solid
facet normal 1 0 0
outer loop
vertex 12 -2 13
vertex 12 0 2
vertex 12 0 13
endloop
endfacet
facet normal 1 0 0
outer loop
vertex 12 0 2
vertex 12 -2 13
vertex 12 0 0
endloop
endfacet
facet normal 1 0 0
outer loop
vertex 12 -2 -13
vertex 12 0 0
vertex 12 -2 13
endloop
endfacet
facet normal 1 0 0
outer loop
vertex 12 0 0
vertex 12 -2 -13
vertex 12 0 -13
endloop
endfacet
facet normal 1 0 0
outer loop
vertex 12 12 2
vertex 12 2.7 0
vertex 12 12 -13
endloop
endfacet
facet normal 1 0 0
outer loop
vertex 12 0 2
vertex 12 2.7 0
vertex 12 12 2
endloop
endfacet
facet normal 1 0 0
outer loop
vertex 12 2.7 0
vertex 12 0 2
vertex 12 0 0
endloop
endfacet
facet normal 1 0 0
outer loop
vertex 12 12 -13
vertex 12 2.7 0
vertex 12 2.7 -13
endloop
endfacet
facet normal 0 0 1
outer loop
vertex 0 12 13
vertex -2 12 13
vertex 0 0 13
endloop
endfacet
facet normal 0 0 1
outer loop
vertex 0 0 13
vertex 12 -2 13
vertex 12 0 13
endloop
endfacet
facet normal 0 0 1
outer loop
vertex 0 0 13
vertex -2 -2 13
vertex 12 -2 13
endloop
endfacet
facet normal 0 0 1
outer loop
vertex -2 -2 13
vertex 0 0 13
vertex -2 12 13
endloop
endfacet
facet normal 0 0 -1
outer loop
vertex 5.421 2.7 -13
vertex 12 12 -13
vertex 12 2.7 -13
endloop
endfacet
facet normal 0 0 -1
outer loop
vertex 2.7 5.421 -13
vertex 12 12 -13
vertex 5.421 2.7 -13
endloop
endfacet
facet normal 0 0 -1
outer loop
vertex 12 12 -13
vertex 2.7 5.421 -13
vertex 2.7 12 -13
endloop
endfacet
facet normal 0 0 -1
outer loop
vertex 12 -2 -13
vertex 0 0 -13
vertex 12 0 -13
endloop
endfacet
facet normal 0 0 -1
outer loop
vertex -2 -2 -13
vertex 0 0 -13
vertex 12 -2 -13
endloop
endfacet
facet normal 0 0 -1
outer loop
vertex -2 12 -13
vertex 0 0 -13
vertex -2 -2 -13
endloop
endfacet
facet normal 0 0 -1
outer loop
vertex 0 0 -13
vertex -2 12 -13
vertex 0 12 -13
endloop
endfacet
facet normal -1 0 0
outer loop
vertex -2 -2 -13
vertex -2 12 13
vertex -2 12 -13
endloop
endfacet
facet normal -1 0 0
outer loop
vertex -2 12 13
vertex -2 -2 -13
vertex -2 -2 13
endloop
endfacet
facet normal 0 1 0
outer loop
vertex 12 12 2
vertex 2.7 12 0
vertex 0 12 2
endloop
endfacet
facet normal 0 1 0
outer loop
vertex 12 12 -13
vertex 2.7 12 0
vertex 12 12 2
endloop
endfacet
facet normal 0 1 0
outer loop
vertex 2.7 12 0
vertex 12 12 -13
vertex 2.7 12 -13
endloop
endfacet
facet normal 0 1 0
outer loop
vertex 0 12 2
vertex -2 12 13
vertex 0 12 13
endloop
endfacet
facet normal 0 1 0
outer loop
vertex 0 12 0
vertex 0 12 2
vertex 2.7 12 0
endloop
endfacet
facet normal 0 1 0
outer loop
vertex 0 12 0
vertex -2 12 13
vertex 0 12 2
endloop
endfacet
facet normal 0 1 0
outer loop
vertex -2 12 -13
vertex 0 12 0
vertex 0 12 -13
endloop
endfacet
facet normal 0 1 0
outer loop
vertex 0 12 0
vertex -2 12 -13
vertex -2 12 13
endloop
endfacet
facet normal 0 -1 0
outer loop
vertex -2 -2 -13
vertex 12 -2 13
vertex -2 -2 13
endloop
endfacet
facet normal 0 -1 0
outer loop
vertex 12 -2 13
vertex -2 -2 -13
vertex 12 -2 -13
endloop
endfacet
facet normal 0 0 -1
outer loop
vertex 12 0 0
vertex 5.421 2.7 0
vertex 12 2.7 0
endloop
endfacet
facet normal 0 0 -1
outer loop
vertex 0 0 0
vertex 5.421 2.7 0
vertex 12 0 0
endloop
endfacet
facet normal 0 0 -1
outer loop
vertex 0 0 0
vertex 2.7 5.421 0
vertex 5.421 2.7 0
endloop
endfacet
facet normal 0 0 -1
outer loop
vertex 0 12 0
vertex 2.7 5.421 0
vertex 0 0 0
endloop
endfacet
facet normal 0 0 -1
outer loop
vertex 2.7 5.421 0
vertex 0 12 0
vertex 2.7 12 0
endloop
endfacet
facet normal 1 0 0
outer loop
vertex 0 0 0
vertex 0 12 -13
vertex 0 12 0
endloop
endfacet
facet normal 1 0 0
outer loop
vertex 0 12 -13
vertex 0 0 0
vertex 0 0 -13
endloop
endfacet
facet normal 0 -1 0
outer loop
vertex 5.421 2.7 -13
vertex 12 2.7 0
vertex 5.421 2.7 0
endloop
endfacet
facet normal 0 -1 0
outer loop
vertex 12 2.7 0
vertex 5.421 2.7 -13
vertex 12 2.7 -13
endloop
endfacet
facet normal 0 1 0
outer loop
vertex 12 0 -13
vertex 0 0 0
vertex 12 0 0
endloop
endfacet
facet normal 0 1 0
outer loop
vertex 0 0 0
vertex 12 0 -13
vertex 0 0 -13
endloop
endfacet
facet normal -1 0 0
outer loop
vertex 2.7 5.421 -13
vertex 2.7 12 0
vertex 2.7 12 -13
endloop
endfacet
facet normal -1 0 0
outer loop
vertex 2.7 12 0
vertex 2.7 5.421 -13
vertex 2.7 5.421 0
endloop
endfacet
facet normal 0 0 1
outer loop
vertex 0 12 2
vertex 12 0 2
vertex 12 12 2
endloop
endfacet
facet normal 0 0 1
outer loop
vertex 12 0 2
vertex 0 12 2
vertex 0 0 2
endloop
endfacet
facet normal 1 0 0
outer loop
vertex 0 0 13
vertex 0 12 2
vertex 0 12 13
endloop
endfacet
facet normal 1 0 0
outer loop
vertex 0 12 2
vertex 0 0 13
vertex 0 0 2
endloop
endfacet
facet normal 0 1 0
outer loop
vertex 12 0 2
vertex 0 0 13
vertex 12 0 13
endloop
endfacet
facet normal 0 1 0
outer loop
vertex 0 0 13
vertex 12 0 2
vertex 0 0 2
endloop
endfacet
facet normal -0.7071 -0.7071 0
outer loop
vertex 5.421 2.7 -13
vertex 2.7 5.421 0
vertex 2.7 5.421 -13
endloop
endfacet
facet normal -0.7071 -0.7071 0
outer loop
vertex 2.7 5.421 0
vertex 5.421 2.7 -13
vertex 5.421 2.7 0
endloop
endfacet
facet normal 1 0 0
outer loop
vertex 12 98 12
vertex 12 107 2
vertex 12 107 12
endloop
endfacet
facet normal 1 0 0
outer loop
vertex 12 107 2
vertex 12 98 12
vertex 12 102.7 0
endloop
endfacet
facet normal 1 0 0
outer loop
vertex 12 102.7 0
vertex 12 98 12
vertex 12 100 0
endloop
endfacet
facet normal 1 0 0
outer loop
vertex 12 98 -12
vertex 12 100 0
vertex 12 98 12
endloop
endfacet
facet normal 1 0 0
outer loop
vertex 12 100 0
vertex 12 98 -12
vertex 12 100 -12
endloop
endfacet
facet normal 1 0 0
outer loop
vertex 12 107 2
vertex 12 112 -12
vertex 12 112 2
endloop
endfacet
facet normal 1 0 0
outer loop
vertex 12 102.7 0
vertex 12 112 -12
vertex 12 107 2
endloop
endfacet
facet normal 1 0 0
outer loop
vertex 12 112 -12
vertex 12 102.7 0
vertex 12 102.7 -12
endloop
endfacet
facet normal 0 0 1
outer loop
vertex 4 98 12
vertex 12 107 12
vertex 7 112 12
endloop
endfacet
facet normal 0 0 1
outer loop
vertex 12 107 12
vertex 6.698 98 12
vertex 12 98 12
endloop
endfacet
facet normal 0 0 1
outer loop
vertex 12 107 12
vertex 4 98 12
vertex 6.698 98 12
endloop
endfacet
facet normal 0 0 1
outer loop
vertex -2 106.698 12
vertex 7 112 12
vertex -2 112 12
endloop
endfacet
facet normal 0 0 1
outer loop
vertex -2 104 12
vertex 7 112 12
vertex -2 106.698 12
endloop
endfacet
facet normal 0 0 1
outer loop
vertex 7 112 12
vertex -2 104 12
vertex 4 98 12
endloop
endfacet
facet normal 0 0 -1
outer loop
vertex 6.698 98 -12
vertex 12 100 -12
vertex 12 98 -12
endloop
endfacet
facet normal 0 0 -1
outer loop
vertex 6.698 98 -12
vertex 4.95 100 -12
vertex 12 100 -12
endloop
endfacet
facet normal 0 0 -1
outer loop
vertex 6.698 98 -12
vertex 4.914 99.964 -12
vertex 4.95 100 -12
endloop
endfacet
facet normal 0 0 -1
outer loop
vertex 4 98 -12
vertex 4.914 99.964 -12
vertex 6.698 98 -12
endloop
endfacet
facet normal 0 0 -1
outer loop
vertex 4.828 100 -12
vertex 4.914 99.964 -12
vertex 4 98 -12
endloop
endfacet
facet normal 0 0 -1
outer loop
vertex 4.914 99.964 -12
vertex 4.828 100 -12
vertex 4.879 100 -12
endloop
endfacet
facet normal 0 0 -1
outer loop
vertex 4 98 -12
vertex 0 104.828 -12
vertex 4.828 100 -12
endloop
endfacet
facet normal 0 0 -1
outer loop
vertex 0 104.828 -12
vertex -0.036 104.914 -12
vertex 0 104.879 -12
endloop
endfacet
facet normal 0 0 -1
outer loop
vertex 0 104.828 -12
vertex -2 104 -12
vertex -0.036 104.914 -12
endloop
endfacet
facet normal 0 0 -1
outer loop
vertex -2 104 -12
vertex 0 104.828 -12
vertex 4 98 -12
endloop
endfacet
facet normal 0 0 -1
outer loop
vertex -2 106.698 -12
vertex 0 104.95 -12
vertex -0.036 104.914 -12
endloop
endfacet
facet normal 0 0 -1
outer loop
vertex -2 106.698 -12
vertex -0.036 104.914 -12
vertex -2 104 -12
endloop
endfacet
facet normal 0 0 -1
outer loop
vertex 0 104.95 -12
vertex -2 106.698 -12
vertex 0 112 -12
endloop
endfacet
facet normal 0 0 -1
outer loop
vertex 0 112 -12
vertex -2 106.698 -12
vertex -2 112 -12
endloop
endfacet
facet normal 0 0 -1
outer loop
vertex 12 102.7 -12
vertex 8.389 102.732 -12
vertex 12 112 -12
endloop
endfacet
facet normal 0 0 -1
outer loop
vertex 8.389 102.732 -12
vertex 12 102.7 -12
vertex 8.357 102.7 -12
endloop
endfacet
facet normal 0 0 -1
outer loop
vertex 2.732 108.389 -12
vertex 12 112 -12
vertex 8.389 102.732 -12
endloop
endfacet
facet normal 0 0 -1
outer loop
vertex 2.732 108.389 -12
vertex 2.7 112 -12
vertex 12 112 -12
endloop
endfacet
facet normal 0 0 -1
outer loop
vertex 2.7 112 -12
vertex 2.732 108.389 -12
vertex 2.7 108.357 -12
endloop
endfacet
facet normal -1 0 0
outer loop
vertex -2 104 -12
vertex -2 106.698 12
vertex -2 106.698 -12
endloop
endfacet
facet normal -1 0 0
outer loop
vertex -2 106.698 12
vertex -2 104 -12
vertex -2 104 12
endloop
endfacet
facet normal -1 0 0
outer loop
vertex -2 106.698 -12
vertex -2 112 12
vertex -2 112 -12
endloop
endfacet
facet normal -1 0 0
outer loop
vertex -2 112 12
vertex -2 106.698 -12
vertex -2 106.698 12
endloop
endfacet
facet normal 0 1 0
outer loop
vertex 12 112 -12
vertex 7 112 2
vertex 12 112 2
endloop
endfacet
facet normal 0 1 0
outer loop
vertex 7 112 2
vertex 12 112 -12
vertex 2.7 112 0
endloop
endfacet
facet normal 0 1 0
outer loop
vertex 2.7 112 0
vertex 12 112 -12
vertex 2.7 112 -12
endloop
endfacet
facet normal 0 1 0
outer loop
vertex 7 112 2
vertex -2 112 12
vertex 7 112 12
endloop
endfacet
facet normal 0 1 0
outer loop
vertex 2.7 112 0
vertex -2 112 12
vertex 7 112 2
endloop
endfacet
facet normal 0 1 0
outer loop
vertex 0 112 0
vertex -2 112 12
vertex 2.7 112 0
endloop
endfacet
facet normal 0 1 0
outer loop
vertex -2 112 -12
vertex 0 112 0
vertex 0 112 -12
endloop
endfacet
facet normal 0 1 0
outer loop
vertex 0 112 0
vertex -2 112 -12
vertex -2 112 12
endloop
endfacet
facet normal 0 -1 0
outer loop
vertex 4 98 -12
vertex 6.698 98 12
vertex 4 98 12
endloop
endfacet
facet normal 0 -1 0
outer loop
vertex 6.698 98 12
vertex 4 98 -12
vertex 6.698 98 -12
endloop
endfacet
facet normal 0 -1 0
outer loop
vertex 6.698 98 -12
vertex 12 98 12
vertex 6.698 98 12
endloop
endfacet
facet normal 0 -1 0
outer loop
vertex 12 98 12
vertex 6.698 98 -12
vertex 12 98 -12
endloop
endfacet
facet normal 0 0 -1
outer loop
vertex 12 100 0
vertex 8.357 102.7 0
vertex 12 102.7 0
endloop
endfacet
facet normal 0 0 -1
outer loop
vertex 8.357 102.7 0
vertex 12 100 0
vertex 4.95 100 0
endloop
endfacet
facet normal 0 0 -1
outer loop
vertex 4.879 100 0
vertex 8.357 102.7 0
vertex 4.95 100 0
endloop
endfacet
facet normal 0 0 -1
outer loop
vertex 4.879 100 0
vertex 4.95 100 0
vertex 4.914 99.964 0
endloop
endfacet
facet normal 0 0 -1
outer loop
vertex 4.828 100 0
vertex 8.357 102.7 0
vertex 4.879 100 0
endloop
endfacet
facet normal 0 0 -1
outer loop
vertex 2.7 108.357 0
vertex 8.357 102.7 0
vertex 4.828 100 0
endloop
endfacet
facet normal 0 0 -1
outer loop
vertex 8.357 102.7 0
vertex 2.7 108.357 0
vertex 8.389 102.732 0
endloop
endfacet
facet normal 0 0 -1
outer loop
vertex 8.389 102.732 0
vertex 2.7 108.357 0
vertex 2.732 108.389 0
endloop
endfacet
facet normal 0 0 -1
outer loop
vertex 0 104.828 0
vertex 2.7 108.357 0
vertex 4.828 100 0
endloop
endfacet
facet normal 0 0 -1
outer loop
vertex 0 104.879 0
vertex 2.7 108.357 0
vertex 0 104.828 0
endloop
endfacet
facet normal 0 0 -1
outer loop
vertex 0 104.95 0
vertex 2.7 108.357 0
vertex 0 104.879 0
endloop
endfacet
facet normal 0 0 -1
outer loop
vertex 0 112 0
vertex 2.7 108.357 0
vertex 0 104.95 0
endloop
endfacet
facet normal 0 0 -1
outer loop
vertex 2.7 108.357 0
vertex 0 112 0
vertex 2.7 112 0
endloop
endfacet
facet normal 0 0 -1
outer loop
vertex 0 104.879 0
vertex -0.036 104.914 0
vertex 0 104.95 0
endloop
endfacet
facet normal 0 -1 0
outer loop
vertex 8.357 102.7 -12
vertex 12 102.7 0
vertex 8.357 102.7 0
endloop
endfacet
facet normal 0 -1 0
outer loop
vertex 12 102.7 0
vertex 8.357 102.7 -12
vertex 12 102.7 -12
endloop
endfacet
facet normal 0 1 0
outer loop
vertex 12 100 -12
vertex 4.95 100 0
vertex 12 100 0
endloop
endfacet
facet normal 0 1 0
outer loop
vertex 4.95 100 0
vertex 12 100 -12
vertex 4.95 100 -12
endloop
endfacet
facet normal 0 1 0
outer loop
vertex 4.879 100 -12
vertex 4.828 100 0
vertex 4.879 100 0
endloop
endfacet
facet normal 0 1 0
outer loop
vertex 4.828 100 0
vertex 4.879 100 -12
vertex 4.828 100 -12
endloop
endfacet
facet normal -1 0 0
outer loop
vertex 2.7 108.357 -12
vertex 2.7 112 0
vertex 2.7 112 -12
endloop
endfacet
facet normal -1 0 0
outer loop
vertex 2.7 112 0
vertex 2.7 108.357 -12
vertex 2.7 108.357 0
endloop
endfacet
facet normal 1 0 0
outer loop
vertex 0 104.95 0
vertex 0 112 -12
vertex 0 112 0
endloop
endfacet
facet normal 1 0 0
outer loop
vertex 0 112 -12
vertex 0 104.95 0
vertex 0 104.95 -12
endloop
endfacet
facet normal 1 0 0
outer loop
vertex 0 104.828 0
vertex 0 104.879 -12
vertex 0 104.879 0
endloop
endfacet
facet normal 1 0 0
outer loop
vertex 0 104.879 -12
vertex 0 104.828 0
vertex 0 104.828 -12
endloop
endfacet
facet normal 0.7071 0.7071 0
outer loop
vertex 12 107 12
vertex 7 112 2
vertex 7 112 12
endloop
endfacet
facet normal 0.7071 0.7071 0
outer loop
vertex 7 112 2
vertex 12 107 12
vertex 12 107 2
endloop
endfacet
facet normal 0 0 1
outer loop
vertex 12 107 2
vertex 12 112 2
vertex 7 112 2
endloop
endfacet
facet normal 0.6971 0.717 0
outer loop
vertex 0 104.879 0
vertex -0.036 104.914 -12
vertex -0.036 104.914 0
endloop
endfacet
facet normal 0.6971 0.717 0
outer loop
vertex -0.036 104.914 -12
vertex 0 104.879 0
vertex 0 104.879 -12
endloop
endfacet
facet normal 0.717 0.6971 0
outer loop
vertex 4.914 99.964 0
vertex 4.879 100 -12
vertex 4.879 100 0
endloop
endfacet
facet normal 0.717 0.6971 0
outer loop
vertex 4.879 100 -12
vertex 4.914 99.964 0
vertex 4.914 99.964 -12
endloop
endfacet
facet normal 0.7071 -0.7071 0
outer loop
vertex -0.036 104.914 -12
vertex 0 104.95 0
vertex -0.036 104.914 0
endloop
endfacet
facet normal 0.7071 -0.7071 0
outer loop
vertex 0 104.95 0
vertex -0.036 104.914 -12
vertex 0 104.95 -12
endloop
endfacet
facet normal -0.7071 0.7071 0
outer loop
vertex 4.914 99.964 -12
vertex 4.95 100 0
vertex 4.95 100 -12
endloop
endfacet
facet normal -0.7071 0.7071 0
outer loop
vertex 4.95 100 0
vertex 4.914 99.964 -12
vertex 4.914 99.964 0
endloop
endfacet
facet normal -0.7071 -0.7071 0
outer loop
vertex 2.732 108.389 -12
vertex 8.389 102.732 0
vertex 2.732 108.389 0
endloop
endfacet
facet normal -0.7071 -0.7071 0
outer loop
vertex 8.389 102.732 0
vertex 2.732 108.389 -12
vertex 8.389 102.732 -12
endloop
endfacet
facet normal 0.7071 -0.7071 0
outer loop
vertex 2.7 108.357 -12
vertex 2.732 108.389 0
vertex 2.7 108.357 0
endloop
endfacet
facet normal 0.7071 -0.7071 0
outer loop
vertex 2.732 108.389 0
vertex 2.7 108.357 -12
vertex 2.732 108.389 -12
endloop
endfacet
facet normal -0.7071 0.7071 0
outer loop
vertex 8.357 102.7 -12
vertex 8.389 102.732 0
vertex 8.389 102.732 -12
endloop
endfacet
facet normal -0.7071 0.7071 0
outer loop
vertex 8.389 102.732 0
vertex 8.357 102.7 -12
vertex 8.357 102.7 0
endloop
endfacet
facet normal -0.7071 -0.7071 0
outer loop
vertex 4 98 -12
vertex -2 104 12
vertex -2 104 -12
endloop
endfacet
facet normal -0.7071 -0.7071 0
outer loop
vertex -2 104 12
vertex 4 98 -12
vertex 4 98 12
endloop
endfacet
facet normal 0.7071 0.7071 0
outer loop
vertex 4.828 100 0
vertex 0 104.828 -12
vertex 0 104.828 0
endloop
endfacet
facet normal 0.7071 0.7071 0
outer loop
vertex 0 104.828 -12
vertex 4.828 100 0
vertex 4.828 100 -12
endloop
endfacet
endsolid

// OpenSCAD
//
// ktRACK10
//
//


gap1 = 0.001;
gap2 = 0.002;

panel_thick = 2;

A = 1;
B = 1;

if(A)
{
difference()
{
    union()
    {
        translate([-panel_thick, -panel_thick, -(12*2+panel_thick)/2]) cube([14, 14, 12*2+panel_thick]);
    }
    
    
    translate([0, 0, -30]) cube([14.5, 2.7, 30]);
    translate([0, 0, -30]) cube([2.7, 39.5, 30]);
    translate([0, 0, panel_thick]) cube([14.5, 39.5, 25]);
    
    translate([3, 3, -30/2]) rotate([0, 0, 45]) cube([3, 4, 30], center=true);
}
}




if(B)
{
translate([0, 100, 0])
{
difference()
{
    union()
    {
        translate([-panel_thick, -panel_thick, -(11*2+panel_thick)/2]) cube([14, 14, 11*2+panel_thick]);
    }
    
    translate([0, -25, -30]) rotate([0, 0, 45]) cube([21, 39.5, 60]);
    
    translate([0, 0, -13]) cube([21, 2.7, 13]);
    translate([0, 0, -13]) cube([2.7, 39.5, 13]);
    translate([19, 0, panel_thick]) rotate([0, 0, 45]) cube([21, 39.5, 25]);
    
    translate([3.5, 3.5, -13/2]) rotate([0, 0, 45]) cube([3, 7, 13], center=true);
    translate([4.5, 4.5, -13/2]) rotate([0, 0, 45]) cube([3, 8, 13], center=true);
}
difference()
{
    union()
    {
        translate([7, -5, -(11*2+panel_thick)/2]) rotate([0, 0, 45]) cube([panel_thick, 15, 11*2+panel_thick]);
    }
    translate([0, -5-panel_thick, -13]) cube([21, 5, 30]);
    translate([-5-panel_thick, 0, -13]) cube([5, 39.5, 30]);
}
}
}
